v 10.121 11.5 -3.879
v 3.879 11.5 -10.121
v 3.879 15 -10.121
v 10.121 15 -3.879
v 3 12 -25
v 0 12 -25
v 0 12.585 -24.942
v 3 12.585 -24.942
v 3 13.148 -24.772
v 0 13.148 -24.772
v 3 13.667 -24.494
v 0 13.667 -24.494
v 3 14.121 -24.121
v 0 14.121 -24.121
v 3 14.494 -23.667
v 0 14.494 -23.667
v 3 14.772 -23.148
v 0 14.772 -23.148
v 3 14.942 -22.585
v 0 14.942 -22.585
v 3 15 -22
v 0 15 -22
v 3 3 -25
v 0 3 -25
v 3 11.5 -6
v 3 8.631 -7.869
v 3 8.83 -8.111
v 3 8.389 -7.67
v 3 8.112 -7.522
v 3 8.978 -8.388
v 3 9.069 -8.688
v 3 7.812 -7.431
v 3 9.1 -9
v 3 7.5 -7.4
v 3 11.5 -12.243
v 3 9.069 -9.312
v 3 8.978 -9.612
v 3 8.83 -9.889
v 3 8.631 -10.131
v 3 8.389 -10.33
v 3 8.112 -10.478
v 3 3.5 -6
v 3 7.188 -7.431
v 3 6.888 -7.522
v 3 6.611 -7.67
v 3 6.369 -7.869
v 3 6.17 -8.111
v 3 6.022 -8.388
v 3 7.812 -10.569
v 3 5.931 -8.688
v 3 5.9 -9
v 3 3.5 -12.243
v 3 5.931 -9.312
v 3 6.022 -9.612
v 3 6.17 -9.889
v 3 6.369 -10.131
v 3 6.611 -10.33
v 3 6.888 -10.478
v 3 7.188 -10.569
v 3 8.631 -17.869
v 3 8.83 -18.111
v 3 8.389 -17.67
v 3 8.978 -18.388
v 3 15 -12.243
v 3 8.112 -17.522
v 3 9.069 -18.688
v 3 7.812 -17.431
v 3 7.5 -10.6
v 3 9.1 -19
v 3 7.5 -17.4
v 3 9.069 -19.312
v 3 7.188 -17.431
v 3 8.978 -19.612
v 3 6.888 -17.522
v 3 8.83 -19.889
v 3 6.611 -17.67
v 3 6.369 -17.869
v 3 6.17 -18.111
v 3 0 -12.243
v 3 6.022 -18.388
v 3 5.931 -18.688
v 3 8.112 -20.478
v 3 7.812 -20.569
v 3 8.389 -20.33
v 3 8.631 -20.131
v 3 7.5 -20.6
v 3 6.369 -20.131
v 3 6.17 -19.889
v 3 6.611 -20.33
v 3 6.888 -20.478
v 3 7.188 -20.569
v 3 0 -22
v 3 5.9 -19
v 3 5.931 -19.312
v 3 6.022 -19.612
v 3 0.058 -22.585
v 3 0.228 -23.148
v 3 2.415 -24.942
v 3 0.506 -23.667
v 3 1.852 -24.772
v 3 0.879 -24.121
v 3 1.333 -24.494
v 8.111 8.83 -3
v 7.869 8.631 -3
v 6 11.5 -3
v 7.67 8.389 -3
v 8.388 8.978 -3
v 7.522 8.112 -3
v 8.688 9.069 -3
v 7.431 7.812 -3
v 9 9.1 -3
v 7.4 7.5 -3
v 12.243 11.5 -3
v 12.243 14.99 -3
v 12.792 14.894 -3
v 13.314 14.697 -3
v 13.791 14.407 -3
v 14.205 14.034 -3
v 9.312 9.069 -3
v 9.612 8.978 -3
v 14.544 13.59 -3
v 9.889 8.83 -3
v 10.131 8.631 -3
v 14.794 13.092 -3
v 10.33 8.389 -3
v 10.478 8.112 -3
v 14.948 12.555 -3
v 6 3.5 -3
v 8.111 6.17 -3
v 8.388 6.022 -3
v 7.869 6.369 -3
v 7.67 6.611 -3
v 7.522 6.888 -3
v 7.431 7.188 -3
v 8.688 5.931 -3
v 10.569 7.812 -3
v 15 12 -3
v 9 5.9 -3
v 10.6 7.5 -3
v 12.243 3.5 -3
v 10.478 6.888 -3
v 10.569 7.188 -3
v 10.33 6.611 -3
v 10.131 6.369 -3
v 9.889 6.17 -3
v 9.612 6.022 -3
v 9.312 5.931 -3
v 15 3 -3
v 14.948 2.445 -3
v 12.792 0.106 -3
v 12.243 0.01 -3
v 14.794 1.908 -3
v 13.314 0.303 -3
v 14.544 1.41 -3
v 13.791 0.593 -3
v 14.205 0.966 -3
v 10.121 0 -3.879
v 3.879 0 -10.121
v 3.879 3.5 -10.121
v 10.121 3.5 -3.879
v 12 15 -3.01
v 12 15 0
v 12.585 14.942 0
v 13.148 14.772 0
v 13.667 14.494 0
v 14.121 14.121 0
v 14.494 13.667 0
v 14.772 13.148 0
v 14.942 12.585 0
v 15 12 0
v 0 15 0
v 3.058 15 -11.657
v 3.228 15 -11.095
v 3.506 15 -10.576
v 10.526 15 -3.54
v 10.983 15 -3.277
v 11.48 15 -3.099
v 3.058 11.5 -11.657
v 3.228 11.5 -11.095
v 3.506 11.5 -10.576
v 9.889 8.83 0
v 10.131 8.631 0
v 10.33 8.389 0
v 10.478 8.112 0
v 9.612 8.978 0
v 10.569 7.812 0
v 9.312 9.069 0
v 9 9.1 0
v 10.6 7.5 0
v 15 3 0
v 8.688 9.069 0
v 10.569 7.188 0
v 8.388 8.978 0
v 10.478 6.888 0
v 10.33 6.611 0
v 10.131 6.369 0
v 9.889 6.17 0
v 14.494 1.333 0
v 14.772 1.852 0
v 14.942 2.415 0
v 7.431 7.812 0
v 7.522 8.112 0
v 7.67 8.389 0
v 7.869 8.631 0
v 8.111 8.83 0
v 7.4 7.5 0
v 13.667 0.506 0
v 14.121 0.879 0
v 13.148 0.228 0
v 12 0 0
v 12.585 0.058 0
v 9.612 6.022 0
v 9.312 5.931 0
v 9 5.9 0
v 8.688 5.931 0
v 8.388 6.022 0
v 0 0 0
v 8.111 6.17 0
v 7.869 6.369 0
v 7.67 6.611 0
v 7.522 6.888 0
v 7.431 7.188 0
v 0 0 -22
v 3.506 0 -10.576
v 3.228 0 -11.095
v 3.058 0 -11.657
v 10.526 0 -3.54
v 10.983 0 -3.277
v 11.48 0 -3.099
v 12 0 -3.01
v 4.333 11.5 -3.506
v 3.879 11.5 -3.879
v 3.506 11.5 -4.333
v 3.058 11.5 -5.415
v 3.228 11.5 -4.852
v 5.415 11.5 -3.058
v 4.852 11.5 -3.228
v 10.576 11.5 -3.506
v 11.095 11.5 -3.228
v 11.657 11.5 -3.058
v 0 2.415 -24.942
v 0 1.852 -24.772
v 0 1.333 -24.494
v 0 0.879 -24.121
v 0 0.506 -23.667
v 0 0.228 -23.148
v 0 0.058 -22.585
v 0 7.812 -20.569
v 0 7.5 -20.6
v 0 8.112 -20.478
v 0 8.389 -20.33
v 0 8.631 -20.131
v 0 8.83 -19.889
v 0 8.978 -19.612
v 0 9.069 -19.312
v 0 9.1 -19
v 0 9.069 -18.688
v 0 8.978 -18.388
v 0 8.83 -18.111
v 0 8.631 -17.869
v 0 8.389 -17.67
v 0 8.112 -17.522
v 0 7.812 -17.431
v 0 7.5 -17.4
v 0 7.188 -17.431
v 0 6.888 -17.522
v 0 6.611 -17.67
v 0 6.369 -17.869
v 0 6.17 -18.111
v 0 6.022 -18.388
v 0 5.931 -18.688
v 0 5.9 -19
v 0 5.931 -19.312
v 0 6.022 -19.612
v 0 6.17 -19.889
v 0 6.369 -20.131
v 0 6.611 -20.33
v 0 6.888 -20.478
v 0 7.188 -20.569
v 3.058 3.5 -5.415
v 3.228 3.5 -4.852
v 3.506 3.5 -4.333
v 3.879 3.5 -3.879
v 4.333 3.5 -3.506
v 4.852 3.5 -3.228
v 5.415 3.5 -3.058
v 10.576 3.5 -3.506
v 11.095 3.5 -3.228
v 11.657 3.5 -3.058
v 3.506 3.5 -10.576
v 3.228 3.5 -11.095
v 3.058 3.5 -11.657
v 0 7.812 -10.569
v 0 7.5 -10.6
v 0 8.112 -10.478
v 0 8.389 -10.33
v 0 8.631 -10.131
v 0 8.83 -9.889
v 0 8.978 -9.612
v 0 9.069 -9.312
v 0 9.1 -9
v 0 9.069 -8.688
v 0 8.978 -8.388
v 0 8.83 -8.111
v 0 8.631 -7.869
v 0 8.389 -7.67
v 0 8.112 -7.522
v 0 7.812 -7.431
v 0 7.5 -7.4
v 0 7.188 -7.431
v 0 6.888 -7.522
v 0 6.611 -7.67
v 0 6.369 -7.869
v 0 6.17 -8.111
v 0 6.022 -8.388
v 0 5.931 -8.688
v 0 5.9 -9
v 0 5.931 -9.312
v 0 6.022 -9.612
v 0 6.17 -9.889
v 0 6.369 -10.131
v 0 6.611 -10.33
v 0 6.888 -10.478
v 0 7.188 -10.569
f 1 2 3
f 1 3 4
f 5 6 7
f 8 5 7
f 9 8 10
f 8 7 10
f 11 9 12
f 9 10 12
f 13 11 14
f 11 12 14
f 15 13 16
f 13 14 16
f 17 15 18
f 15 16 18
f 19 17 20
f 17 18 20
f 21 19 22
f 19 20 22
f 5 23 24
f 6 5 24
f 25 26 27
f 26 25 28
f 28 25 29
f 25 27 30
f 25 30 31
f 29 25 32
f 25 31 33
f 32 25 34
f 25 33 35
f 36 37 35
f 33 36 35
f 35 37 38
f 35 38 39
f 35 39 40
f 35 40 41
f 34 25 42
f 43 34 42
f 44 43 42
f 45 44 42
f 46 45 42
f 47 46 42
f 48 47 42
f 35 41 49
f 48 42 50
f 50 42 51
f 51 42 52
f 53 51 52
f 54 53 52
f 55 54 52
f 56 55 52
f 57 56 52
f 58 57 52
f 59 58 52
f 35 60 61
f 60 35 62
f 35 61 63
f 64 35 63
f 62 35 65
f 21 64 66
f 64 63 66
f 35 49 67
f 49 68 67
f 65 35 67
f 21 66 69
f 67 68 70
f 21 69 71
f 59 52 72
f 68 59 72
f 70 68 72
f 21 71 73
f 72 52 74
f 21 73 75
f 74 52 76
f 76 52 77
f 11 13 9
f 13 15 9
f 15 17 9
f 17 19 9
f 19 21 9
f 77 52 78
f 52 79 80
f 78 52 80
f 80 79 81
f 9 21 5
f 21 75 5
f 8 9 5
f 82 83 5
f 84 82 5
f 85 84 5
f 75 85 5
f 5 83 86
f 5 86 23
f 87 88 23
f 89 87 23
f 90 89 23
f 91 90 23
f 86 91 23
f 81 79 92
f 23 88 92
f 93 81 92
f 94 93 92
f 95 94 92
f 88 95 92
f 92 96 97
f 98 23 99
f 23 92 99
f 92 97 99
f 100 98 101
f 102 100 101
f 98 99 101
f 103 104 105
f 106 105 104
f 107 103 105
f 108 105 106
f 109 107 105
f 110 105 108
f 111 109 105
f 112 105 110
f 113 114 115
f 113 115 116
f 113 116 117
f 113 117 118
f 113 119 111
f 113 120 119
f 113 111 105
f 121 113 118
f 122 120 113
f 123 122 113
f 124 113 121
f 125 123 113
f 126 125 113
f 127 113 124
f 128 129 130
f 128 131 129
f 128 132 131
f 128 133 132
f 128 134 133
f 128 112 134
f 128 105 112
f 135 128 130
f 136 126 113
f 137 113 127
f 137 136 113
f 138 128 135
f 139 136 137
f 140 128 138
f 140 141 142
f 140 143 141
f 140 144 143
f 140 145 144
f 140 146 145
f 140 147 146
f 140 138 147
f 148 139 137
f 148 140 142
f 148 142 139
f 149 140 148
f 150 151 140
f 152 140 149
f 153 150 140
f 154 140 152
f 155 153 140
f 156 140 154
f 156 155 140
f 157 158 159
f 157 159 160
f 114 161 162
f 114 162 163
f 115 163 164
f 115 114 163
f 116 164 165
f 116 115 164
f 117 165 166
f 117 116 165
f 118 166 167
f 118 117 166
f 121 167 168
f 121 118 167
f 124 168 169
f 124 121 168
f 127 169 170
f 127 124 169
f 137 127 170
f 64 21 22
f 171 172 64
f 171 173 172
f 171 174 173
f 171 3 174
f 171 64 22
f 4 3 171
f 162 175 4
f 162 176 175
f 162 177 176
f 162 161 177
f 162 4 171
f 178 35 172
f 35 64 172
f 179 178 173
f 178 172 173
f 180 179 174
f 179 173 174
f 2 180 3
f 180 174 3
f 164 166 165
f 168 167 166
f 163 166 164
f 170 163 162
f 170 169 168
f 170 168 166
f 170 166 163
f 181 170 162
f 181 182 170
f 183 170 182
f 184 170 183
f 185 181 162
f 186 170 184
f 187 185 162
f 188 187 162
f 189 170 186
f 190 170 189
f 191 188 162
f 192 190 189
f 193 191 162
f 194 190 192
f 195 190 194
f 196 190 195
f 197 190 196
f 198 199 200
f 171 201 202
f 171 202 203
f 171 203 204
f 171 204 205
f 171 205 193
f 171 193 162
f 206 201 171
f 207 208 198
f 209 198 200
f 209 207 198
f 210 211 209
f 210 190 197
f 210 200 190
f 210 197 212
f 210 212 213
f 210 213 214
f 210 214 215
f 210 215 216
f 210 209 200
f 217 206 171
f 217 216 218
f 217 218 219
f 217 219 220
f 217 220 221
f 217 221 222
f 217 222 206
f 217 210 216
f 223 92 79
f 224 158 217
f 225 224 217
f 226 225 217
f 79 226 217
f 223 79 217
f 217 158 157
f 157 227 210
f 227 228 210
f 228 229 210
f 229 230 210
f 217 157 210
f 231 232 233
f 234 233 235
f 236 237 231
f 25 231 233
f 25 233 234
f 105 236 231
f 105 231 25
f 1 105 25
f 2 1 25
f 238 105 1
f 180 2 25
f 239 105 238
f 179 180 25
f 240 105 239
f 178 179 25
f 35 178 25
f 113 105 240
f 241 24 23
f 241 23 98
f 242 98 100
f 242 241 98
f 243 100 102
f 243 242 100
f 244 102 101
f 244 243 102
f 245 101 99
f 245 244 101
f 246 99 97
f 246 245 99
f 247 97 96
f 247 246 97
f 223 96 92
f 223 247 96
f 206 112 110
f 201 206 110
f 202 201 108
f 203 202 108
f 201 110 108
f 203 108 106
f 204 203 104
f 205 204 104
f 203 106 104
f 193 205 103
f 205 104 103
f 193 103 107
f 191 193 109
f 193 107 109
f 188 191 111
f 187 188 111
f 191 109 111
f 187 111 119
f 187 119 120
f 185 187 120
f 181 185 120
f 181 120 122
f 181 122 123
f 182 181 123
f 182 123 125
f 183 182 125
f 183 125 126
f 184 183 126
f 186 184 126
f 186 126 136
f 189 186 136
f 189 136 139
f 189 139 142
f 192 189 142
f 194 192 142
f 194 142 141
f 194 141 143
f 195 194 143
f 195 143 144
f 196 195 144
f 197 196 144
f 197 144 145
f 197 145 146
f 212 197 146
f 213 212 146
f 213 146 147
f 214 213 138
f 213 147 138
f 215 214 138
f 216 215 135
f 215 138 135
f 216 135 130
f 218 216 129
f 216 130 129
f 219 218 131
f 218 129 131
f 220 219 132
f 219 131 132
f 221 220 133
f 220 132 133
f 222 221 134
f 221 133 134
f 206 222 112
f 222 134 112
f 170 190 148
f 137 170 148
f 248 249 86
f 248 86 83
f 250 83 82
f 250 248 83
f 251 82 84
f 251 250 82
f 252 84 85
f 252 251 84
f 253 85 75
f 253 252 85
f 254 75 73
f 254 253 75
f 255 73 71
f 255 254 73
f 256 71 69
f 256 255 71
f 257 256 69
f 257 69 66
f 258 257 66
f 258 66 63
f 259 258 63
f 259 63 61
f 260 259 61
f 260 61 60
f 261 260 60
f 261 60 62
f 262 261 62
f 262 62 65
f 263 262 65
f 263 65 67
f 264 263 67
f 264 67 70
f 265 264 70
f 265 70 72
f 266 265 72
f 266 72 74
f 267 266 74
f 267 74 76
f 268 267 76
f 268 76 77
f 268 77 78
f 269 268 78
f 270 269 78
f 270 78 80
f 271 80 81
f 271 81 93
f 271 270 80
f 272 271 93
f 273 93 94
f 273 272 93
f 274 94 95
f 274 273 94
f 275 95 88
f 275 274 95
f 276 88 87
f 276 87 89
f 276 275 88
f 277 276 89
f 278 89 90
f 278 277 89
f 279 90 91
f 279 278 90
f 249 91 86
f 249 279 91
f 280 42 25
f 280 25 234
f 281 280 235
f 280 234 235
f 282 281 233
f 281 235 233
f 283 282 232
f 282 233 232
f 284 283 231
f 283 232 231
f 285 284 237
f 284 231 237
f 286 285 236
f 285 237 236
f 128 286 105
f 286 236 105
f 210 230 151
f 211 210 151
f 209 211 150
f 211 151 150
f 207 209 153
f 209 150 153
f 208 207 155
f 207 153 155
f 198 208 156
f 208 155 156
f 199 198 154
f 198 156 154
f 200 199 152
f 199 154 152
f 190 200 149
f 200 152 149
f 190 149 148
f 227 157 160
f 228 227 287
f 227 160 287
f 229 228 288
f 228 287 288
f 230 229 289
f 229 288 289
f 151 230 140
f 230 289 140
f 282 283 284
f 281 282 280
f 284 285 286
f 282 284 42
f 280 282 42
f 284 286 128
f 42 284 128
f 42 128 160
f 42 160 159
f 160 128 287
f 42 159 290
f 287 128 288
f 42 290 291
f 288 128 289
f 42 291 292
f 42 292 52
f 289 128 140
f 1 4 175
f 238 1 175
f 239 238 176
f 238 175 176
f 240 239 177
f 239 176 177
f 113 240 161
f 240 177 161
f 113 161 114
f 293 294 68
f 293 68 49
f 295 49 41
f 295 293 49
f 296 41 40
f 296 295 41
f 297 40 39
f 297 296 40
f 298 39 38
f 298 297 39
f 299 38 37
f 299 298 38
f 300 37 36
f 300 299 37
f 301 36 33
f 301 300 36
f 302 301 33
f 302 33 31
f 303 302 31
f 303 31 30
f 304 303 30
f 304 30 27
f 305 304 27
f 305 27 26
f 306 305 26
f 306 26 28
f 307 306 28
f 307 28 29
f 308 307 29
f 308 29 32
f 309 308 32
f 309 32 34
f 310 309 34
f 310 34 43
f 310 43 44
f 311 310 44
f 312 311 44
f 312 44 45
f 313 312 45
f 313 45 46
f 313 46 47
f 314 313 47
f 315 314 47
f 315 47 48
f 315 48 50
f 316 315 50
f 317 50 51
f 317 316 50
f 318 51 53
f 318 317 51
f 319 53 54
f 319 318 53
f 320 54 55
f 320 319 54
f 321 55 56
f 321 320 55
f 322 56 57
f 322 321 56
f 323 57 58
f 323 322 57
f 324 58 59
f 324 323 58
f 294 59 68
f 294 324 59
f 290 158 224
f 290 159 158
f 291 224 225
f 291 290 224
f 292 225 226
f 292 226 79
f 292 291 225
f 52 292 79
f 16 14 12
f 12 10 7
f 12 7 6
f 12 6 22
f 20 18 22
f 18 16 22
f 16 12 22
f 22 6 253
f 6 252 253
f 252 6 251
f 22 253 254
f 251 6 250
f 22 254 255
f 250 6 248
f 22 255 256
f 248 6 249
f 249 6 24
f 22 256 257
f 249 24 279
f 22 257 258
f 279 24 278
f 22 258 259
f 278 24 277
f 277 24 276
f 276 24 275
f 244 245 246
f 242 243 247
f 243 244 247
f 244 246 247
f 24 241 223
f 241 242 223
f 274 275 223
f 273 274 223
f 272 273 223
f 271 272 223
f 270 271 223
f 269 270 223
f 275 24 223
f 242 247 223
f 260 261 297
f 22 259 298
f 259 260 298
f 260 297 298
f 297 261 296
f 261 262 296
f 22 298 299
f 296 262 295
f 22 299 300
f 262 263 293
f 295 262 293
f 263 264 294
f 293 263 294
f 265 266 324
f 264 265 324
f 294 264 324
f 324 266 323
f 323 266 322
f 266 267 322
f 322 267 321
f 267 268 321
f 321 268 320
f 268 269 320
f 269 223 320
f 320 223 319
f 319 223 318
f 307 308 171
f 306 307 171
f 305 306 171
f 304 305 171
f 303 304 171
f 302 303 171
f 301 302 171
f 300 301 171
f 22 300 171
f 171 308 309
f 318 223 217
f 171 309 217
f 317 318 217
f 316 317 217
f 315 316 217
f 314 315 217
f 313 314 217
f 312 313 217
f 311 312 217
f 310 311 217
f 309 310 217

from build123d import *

# Parameters (mm, degrees)
SKETCH1_W           = 3
SKETCH1_H           = 22
SKETCH1_H_2         = 3
SKETCH1_W_2         = 12
BOSS_EXTRUDE1_DEPTH = 15
SKETCH2_R           = 1.6
CUT_EXTRUDE1_DEPTH  = 31.56141358
SKETCH3_R           = 1.6
CUT_EXTRUDE2_DEPTH  = 32.527765541
FILLET1_R           = 3
CHAMFER1_SIZE       = 8
SKETCH6_W           = 8
SKETCH6_H           = 8
CUT_EXTRUDE5_DEPTH  = 12
FILLET2_R           = 3
SKETCH7_W           = 15
SKETCH7_H           = 25
CUT_EXTRUDE6_DEPTH  = 33.787192713


with BuildPart() as part:
    # Sketch1 → Boss-Extrude1 (new body)
    with BuildSketch(Plane(origin=(0, 0, 0), x_dir=(1, 0, 0), z_dir=(0, 1, 0))):
        with Locations((1.5, 14)):
            Rectangle(SKETCH1_W, SKETCH1_H)
        with Locations((1.5, 1.5)):
            Rectangle(SKETCH1_W, SKETCH1_H_2)
        with Locations((9, 1.5)):
            Rectangle(SKETCH1_W_2, SKETCH1_H_2)
    extrude(amount=BOSS_EXTRUDE1_DEPTH)

    # Sketch2 → Cut-Extrude1 (cut, through all)
    with BuildSketch(Plane(origin=(0, 0, -3), x_dir=(-1, 0, 0), z_dir=(0, 0, -1))):
        with Locations((-9, 7.5)):
            Circle(SKETCH2_R)
    extrude(amount=-CUT_EXTRUDE1_DEPTH, mode=Mode.SUBTRACT)

    # Sketch3 → Cut-Extrude2 (cut, through all)
    with BuildSketch(Plane(origin=(3, 0, 0), x_dir=(0, 0, -1), z_dir=(1, 0, 0))):
        with Locations((9, 7.5)):
            Circle(SKETCH3_R)
        with Locations((19, 7.5)):
            Circle(SKETCH3_R)
    extrude(amount=-CUT_EXTRUDE2_DEPTH, mode=Mode.SUBTRACT)

    # Fillet1
    fillet1_edges = [part.edges().sort_by_distance(p)[0] for p in [
        (15, 15, -1.5),
        (1.5, 15, -25),
        (1.5, 0, -25),
        (15, 0, -1.5),
    ]]
    fillet(fillet1_edges, radius=FILLET1_R)

    # Chamfer1
    # the kernel refuses this chamfer: 8 mm, written as the material it adds along each edge
    with BuildSketch(Plane(origin=(3, 0, -3), x_dir=(-0.027495876610586382, 0, -0.9996219169112968), z_dir=(0, 1, 0))) as chamfer1_piece_1_section:
        Polygon((CHAMFER1_SIZE * 0.999621916911, -CHAMFER1_SIZE * 0.0274958766106), (-CHAMFER1_SIZE * 0.0274958766106, -CHAMFER1_SIZE * 0.999621916911), (0, 0), align=None)
    chamfer1_piece_1 = extrude(amount=15, mode=Mode.PRIVATE)
    chamfer1_piece_1 = chamfer1_piece_1 - Plane(origin=(5.584357769, 7.5, -9), x_dir=(0, 0, -1), z_dir=(1, 0, 0)) * Cylinder(1.6, 62, mode=Mode.PRIVATE)
    chamfer1_piece_1 = chamfer1_piece_1 - Plane(origin=(9, 7.5, -5.584358399), x_dir=(-1, 0, 0), z_dir=(0, 0, -1)) * Cylinder(1.6, 62, mode=Mode.PRIVATE)
    add(chamfer1_piece_1)

    # Sketch6 → Cut-Extrude5 (cut)
    with BuildSketch(Plane(origin=(15, 0, 0), x_dir=(0, 0, -1), z_dir=(1, 0, 0))):
        with Locations((7, 7.5)):
            Rectangle(SKETCH6_W, SKETCH6_H)
    extrude(amount=-CUT_EXTRUDE5_DEPTH, mode=Mode.SUBTRACT)

    # Fillet2
    fillet2_edges = [part.edges().sort_by_distance(p)[0] for p in [
        (3, 7.5, -3),
        (11, 1.75, -3),
        (3, 1.75, -11),
        (3, 13.25, -11),
        (11, 13.25, -3),
    ]]
    fillet(fillet2_edges, radius=FILLET2_R)

    # Mirror3: part across plane


with BuildPart() as part_1:
    add(part.part)
    add(part.part.mirror(Plane(origin=(0, 15, 0), x_dir=(0, 0, 1), z_dir=(-1, 0, 0))))

    # Sketch7 → Cut-Extrude6 (cut, through all)
    with BuildSketch(Plane.XZ):
        with Locations((-7.5, -12.5)):
            Rectangle(SKETCH7_W, SKETCH7_H)
    extrude(amount=-CUT_EXTRUDE6_DEPTH, mode=Mode.SUBTRACT)


solid = part_1.part
